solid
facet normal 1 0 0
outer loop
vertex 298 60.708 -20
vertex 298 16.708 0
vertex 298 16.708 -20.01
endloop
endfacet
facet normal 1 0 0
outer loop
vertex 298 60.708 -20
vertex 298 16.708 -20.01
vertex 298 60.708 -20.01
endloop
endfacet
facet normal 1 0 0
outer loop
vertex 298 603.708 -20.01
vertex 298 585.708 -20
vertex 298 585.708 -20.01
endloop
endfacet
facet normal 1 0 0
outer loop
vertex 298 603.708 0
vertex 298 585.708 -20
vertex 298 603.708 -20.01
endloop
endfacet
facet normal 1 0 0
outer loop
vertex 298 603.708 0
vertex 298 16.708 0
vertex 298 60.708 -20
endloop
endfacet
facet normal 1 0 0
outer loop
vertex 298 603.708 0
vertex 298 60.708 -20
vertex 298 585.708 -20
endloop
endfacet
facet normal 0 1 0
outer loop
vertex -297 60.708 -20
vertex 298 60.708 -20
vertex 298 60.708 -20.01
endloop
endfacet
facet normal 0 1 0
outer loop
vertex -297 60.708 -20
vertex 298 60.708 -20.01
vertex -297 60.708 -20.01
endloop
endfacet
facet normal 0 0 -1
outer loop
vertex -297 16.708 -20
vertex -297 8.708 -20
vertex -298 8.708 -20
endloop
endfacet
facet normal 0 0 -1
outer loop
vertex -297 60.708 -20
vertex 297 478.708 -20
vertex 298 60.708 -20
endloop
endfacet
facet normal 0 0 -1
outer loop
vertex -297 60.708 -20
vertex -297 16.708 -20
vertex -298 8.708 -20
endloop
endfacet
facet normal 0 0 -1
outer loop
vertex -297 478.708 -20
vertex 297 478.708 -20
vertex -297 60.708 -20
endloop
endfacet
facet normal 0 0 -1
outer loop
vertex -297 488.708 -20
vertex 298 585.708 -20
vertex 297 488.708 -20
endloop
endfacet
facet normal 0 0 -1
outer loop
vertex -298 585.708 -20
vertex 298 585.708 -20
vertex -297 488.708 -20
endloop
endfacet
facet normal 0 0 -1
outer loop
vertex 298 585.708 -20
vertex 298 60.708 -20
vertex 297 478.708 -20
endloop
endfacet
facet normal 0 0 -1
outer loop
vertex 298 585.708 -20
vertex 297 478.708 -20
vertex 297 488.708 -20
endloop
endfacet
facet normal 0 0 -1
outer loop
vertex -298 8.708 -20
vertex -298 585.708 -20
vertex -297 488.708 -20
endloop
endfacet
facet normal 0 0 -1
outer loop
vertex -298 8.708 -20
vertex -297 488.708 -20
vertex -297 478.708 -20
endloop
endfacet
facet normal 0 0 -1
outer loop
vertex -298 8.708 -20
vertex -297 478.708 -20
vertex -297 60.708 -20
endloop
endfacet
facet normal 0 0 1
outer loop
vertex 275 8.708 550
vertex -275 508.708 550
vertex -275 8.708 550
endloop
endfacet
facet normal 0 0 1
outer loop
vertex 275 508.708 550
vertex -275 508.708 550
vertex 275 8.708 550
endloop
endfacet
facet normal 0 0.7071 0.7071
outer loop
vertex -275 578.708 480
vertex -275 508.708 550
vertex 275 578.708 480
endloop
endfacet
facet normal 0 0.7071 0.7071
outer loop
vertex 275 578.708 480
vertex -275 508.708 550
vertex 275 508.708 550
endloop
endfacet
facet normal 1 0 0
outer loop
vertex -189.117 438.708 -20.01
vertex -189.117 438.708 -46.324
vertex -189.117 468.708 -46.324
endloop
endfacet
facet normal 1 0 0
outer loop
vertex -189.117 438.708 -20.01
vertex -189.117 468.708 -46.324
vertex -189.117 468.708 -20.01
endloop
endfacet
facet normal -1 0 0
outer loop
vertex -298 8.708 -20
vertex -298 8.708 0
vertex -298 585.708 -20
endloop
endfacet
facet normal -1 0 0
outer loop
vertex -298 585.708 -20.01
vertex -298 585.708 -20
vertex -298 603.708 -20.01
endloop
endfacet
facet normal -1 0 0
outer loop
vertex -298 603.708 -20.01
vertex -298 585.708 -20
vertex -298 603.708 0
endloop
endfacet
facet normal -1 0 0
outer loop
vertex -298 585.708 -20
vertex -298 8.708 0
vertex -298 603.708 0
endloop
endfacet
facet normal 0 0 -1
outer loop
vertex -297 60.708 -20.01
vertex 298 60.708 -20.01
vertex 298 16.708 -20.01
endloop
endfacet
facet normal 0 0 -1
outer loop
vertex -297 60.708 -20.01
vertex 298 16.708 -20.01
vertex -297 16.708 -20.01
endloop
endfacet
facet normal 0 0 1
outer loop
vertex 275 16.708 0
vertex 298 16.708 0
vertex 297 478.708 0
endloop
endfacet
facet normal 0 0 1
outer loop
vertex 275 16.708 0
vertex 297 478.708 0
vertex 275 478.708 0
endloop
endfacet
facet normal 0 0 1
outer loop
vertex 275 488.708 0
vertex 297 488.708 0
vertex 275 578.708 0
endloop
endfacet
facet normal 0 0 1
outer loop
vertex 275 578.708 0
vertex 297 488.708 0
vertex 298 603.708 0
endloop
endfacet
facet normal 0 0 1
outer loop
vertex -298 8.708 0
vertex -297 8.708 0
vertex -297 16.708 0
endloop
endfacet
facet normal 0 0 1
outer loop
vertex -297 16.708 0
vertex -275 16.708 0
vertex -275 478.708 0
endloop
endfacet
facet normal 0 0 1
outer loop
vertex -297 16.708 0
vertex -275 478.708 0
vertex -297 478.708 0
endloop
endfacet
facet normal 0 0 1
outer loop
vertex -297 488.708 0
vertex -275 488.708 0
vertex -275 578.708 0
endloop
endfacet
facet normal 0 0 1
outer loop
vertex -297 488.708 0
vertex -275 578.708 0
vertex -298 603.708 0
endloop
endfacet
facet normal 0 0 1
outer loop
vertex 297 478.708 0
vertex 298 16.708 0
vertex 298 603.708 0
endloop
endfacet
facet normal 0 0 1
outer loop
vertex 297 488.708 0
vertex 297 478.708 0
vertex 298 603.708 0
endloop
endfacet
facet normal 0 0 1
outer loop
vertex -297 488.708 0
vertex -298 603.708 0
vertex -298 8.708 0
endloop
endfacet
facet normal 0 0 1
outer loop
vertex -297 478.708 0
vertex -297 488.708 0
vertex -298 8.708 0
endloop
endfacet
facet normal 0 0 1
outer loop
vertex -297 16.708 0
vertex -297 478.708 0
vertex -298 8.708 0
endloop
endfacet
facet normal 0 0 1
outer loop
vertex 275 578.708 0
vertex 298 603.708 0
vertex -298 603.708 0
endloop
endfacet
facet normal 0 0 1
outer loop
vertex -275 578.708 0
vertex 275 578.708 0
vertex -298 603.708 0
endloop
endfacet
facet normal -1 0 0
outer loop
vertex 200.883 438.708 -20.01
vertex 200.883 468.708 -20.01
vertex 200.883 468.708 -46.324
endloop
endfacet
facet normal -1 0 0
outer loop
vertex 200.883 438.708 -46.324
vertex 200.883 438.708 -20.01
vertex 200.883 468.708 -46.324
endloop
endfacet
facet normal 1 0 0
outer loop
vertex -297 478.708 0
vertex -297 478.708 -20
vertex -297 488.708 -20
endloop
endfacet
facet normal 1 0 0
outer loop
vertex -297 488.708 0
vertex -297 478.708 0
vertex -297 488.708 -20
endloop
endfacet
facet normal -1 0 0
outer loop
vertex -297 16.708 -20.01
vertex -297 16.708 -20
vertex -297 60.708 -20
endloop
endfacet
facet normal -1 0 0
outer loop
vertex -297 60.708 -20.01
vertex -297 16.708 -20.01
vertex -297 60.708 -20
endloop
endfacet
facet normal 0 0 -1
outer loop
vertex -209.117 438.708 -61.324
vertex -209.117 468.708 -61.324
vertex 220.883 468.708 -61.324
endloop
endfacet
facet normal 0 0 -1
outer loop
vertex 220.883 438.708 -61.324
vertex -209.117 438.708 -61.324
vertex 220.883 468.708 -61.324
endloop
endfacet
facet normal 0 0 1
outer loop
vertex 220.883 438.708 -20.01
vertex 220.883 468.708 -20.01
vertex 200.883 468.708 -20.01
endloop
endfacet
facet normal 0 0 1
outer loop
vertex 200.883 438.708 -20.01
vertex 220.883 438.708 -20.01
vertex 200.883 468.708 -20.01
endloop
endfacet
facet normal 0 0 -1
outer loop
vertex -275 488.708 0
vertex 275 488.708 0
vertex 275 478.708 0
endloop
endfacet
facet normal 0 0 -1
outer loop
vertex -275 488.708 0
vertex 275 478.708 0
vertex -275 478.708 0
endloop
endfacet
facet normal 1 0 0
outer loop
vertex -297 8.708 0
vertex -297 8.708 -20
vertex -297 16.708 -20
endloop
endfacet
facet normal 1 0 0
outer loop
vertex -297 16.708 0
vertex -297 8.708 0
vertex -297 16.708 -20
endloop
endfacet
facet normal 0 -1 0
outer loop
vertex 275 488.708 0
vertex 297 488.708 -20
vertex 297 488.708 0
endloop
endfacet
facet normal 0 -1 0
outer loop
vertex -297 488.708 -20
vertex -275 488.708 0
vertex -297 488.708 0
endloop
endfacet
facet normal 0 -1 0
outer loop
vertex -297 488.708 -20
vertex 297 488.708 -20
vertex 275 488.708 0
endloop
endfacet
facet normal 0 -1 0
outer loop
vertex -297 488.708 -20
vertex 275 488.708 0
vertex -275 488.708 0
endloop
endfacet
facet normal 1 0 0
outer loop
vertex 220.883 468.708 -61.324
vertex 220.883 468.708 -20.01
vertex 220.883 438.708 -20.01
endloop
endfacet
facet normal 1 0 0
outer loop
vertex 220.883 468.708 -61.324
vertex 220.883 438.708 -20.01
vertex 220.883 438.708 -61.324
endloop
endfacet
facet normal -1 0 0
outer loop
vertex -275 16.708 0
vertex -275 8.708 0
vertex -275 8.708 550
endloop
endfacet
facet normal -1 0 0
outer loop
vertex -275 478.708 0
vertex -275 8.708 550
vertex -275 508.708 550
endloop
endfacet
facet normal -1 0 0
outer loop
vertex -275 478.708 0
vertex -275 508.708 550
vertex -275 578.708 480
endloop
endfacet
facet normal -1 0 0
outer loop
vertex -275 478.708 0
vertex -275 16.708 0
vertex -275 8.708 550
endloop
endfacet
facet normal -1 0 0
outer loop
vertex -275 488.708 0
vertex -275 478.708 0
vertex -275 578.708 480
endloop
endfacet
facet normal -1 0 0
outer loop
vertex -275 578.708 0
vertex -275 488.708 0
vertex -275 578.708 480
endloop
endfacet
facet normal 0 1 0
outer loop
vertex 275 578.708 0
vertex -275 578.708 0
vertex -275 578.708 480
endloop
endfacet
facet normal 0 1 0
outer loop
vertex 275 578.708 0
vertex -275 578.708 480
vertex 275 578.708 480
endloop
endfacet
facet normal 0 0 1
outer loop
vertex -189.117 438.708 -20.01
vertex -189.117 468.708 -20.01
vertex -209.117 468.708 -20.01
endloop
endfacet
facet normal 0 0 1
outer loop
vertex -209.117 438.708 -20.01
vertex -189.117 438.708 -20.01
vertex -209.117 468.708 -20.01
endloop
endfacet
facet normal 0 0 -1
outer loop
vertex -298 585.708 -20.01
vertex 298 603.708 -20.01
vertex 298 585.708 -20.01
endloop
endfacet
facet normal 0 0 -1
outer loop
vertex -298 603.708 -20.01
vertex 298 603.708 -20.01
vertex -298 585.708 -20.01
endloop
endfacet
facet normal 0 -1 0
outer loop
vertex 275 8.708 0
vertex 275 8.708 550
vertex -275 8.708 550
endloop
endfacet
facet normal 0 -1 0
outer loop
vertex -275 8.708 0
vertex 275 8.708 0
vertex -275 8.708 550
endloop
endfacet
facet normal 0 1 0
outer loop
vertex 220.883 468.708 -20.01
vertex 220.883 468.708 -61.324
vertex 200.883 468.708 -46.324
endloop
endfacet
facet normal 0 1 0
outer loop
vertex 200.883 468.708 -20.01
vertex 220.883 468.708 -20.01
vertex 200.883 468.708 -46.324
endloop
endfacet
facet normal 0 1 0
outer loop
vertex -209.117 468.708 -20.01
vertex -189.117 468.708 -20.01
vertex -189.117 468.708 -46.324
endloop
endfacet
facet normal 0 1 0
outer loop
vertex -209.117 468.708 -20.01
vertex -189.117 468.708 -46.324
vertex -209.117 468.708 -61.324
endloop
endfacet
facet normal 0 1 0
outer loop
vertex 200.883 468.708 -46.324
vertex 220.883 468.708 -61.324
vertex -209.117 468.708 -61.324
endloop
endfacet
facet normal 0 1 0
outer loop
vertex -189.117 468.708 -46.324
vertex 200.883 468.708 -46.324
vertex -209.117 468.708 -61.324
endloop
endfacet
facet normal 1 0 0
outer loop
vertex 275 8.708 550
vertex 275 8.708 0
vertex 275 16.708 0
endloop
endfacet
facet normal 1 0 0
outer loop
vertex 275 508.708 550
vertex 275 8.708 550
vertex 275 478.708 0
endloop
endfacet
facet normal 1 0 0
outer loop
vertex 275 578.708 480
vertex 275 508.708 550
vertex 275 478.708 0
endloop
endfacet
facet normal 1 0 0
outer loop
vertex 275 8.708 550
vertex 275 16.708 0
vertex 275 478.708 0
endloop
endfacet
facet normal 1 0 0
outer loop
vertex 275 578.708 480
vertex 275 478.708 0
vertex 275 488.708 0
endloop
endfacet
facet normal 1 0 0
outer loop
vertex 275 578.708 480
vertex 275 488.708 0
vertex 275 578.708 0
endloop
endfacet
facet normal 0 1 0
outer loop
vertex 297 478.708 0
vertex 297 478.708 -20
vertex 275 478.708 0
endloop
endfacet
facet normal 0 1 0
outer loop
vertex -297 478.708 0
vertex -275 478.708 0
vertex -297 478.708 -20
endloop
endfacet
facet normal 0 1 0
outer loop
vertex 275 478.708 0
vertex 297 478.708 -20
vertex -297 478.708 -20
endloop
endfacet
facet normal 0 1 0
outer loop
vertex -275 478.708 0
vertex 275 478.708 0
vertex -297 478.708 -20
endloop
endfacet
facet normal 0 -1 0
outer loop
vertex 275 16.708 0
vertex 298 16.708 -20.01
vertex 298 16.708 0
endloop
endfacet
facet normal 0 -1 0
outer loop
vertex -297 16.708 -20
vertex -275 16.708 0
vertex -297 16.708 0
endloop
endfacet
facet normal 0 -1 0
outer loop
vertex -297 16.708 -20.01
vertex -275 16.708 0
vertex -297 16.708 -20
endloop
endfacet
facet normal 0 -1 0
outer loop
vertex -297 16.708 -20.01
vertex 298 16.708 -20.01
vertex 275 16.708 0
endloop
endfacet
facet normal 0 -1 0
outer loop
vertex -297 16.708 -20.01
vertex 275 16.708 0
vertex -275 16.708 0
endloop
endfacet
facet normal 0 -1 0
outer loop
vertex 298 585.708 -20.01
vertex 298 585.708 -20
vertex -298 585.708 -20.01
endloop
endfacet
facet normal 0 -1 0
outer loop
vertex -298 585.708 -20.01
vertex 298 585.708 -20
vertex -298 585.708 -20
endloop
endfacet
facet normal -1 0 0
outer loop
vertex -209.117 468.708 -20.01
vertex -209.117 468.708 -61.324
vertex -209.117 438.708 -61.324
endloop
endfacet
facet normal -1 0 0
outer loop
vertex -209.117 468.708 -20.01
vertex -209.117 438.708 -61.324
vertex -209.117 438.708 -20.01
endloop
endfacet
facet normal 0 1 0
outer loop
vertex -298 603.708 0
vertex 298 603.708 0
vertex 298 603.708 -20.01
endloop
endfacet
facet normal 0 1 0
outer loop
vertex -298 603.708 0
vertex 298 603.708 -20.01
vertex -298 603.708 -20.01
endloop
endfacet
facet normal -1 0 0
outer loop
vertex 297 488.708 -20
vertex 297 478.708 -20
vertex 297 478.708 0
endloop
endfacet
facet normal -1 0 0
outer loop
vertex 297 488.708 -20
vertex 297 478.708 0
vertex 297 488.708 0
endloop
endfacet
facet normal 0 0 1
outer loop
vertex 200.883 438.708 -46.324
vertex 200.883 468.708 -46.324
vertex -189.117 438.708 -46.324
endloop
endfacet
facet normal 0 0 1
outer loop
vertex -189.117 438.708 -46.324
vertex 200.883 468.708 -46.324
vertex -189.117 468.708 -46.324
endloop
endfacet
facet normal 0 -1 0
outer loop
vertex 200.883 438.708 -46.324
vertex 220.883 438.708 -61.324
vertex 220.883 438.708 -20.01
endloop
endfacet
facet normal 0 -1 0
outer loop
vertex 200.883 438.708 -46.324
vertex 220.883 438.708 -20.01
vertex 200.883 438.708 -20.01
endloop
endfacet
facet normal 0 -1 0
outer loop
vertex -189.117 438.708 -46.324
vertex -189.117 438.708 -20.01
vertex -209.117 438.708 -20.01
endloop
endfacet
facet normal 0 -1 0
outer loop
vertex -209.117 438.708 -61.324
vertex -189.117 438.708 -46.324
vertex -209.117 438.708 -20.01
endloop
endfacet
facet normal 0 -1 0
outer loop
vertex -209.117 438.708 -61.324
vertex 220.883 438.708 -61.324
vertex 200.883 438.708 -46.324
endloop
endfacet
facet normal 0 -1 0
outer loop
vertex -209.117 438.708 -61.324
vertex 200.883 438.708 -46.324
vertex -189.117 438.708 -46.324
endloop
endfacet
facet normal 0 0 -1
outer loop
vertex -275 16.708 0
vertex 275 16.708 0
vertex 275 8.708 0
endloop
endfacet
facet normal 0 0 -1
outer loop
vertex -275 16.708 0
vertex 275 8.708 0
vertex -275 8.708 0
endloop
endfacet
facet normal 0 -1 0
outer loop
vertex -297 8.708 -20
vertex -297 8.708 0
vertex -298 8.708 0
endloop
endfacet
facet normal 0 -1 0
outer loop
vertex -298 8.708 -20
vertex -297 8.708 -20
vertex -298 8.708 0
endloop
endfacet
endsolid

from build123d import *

# Parameters (mm, degrees)
SKETCH2_W           = 550
SKETCH2_H           = 570
BOSS_EXTRUDE2_DEPTH = 550
CHAMFER1_SIZE       = 70
SKETCH3_W           = 596
SKETCH3_H           = 595
BOSS_EXTRUDE3_DEPTH = 20
SKETCH4_W           = 595
SKETCH4_H           = 52
SKETCH4_W_2         = 596
SKETCH4_H_2         = 18
BOSS_EXTRUDE4_DEPTH = 0.01
SKETCH5_W           = 595
SKETCH5_H           = 8
SKETCH5_W_2         = 594
SKETCH5_H_2         = 10
CUT_EXTRUDE1_DEPTH  = 20.01
BOSS_EXTRUDE5_DEPTH = 30


with BuildPart() as part:
    # Sketch2 → Boss-Extrude2 (new body)
    with BuildSketch(Plane.XY):
        with Locations((0, 293.707988466)):
            Rectangle(SKETCH2_W, SKETCH2_H)
    extrude(amount=BOSS_EXTRUDE2_DEPTH)

    # Chamfer1
    chamfer1_edges = [part.edges().sort_by_distance(p)[0] for p in [
        (0, 578.707988466, 550),
    ]]
    chamfer(chamfer1_edges, length=CHAMFER1_SIZE)

    # Sketch3 → Boss-Extrude3 (add)
    with BuildSketch(Plane(origin=(0, 0, 0), x_dir=(-1, 0, 0), z_dir=(0, 0, -1))):
        with Locations((0, 306.207988466)):
            Rectangle(SKETCH3_W, SKETCH3_H)
    extrude(amount=BOSS_EXTRUDE3_DEPTH)

    # Sketch4 → Boss-Extrude4 (add)
    with BuildSketch(Plane(origin=(0, 0, -20), x_dir=(-1, 0, 0), z_dir=(0, 0, -1))):
        with Locations((-0.5, 34.707988466)):
            Rectangle(SKETCH4_W, SKETCH4_H)
        with Locations((0, 594.707988466)):
            Rectangle(SKETCH4_W_2, SKETCH4_H_2)
    extrude(amount=BOSS_EXTRUDE4_DEPTH)

    # Sketch5 → Cut-Extrude1 (cut)
    with BuildSketch(Plane(origin=(0, 0, -20.01), x_dir=(-1, 0, 0), z_dir=(0, 0, -1))):
        with Locations((-0.5, 12.707988466)):
            Rectangle(SKETCH5_W, SKETCH5_H)
        with Locations((0, 483.707988466)):
            Rectangle(SKETCH5_W_2, SKETCH5_H_2)
    extrude(amount=-CUT_EXTRUDE1_DEPTH, mode=Mode.SUBTRACT)


with BuildPart() as body_2:
    # Sketch7 → Boss-Extrude5 (new body)
    with BuildSketch(Plane(origin=(0, 468.707988466, 0), x_dir=(1, 0, 0), z_dir=(0, 1, 0))):
        Polygon((-209.116922129, 61.324222613), (220.883077871, 61.324222613), (220.883077871, 46.324222613), (220.883077871, 20.01), (200.883077871, 20.01), (200.883077871, 46.324222613), (-189.116922129, 46.324222613), (-189.116922129, 20.01), (-209.116922129, 20.01), (-209.116922129, 46.324222613), align=None)
    extrude(amount=-BOSS_EXTRUDE5_DEPTH)


solid = Compound([part.part, body_2.part])
